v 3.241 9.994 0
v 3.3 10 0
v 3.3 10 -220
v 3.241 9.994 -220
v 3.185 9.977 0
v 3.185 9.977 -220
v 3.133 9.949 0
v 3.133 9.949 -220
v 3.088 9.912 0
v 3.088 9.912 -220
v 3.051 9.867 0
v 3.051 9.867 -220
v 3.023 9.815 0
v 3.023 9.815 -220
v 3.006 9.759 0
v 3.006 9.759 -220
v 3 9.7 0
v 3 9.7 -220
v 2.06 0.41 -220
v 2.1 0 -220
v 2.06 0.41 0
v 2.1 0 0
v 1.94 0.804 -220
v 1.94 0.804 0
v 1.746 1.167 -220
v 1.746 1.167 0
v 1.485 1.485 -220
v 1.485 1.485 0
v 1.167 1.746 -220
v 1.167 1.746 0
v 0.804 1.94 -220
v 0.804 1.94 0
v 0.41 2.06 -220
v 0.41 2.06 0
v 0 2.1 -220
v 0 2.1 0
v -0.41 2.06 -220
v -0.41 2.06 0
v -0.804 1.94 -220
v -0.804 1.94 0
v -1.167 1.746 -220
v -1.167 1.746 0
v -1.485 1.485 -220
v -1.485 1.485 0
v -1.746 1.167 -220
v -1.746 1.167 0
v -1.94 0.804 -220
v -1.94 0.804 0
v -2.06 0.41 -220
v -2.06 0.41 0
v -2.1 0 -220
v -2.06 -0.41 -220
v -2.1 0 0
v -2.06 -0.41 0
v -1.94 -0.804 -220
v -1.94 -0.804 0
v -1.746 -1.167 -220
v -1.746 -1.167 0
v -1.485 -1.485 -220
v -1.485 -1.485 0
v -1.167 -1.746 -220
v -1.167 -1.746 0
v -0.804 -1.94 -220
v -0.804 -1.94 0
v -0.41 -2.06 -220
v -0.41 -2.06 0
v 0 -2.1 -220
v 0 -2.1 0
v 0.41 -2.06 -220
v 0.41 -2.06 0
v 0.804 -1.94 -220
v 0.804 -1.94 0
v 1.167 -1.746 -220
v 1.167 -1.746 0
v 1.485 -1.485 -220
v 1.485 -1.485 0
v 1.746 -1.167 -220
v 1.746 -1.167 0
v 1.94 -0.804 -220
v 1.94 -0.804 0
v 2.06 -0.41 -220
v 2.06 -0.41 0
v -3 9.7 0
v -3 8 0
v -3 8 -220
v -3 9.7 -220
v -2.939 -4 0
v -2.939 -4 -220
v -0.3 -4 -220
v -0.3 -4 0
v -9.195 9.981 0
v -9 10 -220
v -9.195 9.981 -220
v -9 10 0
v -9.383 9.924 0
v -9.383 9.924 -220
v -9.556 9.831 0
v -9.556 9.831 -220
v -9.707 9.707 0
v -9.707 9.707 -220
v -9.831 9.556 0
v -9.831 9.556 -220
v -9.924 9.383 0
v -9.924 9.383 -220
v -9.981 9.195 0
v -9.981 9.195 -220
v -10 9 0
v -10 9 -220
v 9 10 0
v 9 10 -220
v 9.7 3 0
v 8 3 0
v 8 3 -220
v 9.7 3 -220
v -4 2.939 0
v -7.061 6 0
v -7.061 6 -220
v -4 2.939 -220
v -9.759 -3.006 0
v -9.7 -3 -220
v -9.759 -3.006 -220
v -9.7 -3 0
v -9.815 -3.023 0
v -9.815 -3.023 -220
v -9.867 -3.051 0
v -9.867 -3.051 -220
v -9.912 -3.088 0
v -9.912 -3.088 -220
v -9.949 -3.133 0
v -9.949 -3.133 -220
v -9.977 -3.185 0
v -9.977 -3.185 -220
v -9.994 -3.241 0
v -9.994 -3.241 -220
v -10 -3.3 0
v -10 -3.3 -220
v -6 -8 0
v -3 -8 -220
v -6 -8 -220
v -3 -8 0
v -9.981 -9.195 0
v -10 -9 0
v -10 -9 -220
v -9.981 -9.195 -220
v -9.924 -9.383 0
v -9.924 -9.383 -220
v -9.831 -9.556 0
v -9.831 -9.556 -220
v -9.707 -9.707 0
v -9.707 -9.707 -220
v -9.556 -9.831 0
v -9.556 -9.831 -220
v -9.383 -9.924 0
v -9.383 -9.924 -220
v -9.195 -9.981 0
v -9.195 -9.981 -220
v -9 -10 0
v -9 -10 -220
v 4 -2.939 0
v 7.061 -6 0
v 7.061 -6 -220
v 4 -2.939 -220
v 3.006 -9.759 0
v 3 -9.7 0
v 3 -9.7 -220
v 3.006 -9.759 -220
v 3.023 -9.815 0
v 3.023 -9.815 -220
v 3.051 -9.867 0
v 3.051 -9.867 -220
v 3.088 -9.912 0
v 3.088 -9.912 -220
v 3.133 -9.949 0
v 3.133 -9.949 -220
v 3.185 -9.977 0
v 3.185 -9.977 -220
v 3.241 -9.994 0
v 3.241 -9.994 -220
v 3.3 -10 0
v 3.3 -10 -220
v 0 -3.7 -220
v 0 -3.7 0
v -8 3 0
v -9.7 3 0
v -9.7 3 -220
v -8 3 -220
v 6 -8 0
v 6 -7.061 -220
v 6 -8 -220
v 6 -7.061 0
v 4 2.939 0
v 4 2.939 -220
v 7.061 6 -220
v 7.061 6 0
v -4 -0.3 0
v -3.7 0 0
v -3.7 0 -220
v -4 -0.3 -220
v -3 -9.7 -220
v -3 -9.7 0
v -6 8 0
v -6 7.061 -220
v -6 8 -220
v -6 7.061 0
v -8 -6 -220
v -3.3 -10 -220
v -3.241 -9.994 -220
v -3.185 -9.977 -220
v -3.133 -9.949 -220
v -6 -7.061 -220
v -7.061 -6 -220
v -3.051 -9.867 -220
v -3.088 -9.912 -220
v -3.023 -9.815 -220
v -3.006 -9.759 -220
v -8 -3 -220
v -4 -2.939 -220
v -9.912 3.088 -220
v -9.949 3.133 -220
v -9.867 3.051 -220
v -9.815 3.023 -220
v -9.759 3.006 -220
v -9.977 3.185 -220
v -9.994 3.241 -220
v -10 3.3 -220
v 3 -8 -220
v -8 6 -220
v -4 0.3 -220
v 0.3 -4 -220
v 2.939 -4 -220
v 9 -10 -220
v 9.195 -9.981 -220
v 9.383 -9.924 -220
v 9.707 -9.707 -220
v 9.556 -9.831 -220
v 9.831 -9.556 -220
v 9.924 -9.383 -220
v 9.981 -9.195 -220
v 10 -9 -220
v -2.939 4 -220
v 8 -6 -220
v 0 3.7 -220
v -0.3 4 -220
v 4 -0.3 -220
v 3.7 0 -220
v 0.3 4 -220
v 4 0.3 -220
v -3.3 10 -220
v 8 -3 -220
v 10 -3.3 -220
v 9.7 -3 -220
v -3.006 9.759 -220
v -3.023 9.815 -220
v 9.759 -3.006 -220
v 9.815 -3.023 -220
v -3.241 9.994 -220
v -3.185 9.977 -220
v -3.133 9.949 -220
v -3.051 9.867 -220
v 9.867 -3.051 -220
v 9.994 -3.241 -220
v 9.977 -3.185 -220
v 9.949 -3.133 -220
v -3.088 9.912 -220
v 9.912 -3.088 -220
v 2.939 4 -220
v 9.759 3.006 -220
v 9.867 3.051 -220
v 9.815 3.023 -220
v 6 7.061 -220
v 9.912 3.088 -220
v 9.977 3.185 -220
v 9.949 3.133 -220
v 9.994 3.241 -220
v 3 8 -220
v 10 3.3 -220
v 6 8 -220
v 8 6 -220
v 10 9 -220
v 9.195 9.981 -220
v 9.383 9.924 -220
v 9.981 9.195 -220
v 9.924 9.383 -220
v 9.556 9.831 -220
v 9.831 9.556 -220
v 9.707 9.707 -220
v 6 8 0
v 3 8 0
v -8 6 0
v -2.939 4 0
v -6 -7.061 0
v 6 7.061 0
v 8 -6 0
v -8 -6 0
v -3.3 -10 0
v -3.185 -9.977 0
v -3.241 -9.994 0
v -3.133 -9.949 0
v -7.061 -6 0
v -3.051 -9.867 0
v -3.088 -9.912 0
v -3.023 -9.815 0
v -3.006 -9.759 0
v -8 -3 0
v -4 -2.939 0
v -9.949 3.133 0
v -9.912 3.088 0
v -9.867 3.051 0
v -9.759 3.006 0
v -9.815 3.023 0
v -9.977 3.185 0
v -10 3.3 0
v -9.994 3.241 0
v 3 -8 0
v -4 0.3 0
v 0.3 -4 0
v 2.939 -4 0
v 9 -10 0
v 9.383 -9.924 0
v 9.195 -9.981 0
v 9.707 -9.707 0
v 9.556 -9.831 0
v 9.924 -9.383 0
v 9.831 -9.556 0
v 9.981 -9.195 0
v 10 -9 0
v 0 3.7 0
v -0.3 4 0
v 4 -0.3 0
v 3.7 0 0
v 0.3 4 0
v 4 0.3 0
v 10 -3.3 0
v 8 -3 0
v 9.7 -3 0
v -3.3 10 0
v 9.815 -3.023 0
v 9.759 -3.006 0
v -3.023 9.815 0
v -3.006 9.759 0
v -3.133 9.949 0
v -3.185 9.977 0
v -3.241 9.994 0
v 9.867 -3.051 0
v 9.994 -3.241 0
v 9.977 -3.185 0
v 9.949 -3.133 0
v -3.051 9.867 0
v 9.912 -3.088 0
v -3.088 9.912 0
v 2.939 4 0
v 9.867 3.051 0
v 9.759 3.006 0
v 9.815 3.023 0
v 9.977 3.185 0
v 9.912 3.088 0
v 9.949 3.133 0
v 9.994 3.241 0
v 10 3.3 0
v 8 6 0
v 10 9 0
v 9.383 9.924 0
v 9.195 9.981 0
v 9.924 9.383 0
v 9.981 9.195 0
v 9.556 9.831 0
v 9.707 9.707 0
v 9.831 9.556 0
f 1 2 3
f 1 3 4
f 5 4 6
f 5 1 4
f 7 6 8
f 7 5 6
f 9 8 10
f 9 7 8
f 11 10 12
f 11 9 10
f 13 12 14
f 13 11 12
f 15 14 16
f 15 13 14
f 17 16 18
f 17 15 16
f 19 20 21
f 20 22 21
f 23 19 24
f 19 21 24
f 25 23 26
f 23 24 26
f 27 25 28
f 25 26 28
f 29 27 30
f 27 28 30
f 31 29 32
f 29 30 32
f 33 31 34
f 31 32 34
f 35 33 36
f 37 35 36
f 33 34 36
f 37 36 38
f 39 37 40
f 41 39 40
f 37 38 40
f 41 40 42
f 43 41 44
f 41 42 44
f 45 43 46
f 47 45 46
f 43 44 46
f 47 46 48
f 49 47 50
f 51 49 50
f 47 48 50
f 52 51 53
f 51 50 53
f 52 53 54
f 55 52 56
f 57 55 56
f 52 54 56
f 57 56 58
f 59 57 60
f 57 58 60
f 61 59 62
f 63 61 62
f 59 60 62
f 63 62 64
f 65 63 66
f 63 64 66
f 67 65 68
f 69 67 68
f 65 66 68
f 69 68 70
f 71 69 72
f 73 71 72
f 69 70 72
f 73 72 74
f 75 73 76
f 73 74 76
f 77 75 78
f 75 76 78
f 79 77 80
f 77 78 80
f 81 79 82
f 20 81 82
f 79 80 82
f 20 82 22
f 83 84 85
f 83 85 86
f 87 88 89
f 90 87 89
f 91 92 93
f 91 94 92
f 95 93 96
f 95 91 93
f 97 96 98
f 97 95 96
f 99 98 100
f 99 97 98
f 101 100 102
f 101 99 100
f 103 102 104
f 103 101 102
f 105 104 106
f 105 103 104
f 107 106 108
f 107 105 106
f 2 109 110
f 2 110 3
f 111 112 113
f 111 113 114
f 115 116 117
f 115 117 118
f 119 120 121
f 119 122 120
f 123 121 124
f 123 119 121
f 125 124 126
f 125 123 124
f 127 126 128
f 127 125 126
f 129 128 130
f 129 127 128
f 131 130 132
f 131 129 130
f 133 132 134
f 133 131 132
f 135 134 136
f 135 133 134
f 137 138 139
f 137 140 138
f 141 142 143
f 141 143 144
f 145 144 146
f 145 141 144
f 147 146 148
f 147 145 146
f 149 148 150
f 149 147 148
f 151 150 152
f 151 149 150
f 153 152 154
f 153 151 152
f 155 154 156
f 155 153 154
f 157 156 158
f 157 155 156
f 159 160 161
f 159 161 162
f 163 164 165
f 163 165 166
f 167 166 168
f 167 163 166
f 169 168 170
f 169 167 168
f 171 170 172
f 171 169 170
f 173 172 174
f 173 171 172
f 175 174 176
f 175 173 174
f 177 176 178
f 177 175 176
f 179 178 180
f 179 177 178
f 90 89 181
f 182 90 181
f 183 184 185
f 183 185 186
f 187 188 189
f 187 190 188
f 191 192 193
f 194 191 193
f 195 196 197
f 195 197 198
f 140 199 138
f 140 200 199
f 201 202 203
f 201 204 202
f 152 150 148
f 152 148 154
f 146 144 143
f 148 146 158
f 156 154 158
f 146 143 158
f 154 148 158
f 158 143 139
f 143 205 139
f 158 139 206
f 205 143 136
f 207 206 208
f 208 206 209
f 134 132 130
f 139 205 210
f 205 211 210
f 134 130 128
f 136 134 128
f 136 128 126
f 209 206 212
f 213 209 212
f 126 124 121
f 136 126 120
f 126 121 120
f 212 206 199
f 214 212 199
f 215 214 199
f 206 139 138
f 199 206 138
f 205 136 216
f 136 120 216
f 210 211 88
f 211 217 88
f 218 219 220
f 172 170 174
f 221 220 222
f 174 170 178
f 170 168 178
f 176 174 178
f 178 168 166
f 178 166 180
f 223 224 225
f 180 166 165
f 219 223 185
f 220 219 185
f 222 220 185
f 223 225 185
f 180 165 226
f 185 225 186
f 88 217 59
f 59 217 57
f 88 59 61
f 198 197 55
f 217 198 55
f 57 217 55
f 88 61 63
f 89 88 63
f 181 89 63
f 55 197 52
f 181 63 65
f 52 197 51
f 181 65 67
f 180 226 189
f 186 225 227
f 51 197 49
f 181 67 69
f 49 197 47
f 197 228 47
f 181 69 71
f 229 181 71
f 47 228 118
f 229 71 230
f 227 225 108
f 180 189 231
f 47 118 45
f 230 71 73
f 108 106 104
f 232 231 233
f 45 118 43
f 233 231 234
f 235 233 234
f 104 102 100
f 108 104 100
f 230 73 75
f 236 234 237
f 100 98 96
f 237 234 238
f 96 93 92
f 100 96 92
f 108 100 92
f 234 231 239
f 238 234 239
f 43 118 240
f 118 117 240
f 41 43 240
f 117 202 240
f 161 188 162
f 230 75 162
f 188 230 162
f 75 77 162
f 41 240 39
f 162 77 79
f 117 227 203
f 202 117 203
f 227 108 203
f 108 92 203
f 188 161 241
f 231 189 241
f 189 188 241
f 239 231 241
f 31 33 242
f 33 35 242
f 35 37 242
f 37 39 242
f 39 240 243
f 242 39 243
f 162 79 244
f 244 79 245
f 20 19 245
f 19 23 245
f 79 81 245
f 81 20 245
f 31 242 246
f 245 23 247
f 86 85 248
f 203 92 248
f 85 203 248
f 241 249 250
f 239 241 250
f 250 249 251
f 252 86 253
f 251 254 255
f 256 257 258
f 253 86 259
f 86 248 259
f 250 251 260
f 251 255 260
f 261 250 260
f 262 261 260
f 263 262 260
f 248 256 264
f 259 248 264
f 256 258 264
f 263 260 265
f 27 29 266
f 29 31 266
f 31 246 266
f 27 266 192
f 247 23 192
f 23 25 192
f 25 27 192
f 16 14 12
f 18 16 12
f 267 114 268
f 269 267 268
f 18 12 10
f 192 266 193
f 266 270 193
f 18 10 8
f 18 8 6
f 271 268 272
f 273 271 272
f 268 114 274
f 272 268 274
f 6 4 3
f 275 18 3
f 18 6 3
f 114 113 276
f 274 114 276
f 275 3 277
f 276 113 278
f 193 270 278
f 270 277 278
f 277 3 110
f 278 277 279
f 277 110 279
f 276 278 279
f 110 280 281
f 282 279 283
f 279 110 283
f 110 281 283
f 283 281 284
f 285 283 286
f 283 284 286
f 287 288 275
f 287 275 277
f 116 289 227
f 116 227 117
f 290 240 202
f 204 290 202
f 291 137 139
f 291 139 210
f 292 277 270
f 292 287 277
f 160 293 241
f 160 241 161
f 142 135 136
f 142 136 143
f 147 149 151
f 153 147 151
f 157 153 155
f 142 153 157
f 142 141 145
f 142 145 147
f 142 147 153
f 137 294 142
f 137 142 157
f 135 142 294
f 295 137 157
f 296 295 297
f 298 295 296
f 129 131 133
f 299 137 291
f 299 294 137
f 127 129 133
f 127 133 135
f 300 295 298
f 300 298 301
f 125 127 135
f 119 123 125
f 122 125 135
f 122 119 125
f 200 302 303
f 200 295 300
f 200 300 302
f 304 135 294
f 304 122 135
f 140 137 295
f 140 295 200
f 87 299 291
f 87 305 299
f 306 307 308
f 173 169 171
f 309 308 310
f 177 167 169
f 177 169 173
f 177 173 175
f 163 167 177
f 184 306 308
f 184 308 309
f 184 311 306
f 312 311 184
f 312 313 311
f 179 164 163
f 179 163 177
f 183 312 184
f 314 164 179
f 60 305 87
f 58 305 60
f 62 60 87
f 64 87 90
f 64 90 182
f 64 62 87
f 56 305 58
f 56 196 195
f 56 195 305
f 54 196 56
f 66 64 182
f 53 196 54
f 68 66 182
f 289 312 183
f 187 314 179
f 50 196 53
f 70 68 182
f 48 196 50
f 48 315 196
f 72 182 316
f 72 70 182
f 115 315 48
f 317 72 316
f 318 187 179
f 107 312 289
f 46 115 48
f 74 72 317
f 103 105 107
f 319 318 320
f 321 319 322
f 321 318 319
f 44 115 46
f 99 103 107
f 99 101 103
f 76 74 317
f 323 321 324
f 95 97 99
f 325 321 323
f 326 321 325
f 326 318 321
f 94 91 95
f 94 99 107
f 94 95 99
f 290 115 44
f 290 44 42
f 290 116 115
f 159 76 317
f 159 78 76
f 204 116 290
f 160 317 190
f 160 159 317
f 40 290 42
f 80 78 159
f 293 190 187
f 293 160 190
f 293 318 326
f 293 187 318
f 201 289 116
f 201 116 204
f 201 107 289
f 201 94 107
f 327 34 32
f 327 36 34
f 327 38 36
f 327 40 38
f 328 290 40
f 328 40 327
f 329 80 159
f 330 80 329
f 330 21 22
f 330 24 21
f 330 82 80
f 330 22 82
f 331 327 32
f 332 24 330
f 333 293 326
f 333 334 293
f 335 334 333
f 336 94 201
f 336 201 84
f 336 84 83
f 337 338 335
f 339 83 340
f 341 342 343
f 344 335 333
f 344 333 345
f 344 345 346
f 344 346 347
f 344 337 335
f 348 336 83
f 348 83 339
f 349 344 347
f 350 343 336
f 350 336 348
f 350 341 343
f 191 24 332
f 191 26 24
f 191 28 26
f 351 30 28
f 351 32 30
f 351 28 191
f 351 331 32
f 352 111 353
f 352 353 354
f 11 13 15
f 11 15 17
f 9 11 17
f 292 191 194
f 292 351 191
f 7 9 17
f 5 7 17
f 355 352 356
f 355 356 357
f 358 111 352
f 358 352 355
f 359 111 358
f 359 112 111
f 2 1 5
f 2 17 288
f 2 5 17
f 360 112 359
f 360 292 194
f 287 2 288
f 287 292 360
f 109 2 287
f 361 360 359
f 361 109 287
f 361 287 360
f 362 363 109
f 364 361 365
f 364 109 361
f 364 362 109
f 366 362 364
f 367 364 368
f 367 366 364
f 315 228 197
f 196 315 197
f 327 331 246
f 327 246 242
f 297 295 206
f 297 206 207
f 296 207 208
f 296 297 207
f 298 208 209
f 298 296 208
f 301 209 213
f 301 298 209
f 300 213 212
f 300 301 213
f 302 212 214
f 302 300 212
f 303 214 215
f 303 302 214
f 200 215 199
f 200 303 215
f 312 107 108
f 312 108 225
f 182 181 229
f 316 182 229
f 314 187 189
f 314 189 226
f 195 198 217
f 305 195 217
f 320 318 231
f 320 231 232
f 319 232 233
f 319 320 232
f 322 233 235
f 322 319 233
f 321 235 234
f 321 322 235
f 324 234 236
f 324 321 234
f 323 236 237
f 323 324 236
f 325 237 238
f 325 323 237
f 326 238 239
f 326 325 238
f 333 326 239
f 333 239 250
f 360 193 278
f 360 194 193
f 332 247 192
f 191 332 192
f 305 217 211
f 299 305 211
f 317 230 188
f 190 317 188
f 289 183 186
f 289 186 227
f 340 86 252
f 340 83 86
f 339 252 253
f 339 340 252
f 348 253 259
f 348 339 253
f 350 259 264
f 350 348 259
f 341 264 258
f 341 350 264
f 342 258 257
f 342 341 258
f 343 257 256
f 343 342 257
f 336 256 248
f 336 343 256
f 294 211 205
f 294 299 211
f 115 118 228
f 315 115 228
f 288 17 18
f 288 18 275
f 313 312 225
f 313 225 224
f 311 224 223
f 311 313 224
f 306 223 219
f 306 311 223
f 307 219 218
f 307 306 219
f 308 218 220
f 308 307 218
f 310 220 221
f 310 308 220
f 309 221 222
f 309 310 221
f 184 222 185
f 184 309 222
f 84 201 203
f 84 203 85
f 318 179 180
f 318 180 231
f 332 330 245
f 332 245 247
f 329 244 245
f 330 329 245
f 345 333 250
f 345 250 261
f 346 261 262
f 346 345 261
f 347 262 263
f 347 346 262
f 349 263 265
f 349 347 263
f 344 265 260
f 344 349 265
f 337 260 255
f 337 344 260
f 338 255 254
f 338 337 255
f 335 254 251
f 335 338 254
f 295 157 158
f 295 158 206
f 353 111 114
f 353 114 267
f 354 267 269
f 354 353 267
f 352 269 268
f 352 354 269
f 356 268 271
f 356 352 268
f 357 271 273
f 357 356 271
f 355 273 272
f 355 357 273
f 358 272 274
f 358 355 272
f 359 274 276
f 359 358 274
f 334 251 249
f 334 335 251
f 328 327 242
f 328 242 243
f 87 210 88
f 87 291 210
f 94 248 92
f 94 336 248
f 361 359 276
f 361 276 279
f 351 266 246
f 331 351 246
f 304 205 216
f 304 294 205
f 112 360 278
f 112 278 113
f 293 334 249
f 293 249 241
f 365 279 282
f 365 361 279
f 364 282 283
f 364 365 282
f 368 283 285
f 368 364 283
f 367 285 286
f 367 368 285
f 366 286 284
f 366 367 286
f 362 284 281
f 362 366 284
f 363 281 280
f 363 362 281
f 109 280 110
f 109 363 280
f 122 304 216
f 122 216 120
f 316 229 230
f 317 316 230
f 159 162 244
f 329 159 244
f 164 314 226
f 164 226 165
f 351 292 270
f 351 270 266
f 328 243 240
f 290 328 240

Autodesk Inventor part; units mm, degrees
ref_plane "YZ Plane" through (0, 0, 0) normal (1, 0, 0) x (0, 1, 0)
ref_plane "XZ Plane" through (0, 0, 0) normal (0, 1, 0) x (-1, 0, 0)
ref_plane "XY Plane" through (0, 0, 0) normal (0, 0, 1) x (1, 0, 0)
sketch "Sketch_5" plane through (0, 0, 0) normal (0, 0, 1) x (1, 0, 0)
  line L0 (-10, 9) -> (-10, 3.3)
  arc A0 (-10, 3.3) -> (-9.7, 3) centre (-9.7, 3.3) ccw
  line L1 (-9.7, 3) -> (-8, 3)
  line L2 (-8, 3) -> (-8, 6)
  line L3 (-8, 6) -> (-7.0607, 6)
  line L4 (-7.0607, 6) -> (-4, 2.9393)
  line L5 (-4, 2.9393) -> (-4, 0.3)
  line L6 (-4, 0.3) -> (-3.7, 0)
  line L7 (-3.7, 0) -> (-4, -0.3)
  line L8 (-4, -0.3) -> (-4, -2.9393)
  line L9 (-4, -2.9393) -> (-7.0607, -6)
  line L10 (-7.0607, -6) -> (-8, -6)
  line L11 (-8, -6) -> (-8, -3)
  line L12 (-8, -3) -> (-9.7, -3)
  arc A1 (-9.7, -3) -> (-10, -3.3) centre (-9.7, -3.3) ccw
  line L13 (-10, -3.3) -> (-10, -9)
  arc A2 (-10, -9) -> (-9, -10) centre (-9, -9) ccw
  line L14 (-9, -10) -> (-3.3, -10)
  arc A3 (-3.3, -10) -> (-3, -9.7) centre (-3.3, -9.7) ccw
  line L15 (-3, -9.7) -> (-3, -8)
  line L16 (-3, -8) -> (-6, -8)
  line L17 (-6, -8) -> (-6, -7.0607)
  line L18 (-6, -7.0607) -> (-2.9393, -4)
  line L19 (-2.9393, -4) -> (-0.3, -4)
  line L20 (-0.3, -4) -> (0, -3.7)
  line L21 (0, -3.7) -> (0.3, -4)
  line L22 (0.3, -4) -> (2.9393, -4)
  line L23 (2.9393, -4) -> (6, -7.0607)
  line L24 (6, -7.0607) -> (6, -8)
  line L25 (6, -8) -> (3, -8)
  line L26 (3, -8) -> (3, -9.7)
  arc A4 (3, -9.7) -> (3.3, -10) centre (3.3, -9.7) ccw
  line L27 (3.3, -10) -> (9, -10)
  arc A5 (9, -10) -> (10, -9) centre (9, -9) ccw
  line L28 (10, -9) -> (10, -3.3)
  arc A6 (10, -3.3) -> (9.7, -3) centre (9.7, -3.3) ccw
  line L29 (9.7, -3) -> (8, -3)
  line L30 (8, -3) -> (8, -6)
  line L31 (8, -6) -> (7.0607, -6)
  line L32 (7.0607, -6) -> (4, -2.9393)
  line L33 (4, -2.9393) -> (4, -0.3)
  line L34 (4, -0.3) -> (3.7, 0)
  line L35 (3.7, 0) -> (4, 0.3)
  line L36 (4, 0.3) -> (4, 2.9393)
  line L37 (4, 2.9393) -> (7.0607, 6)
  line L38 (7.0607, 6) -> (8, 6)
  line L39 (8, 6) -> (8, 3)
  line L40 (8, 3) -> (9.7, 3)
  arc A7 (9.7, 3) -> (10, 3.3) centre (9.7, 3.3) ccw
  line L41 (10, 3.3) -> (10, 9)
  arc A8 (10, 9) -> (9, 10) centre (9, 9) ccw
  line L42 (9, 10) -> (3.3, 10)
  arc A9 (3.3, 10) -> (3, 9.7) centre (3.3, 9.7) ccw
  line L43 (3, 9.7) -> (3, 8)
  line L44 (3, 8) -> (6, 8)
  line L45 (6, 8) -> (6, 7.0607)
  line L46 (6, 7.0607) -> (2.9393, 4)
  line L47 (2.9393, 4) -> (0.3, 4)
  line L48 (0.3, 4) -> (0, 3.7)
  line L49 (0, 3.7) -> (-0.3, 4)
  line L50 (-0.3, 4) -> (-2.9393, 4)
  line L51 (-2.9393, 4) -> (-6, 7.0607)
  line L52 (-6, 7.0607) -> (-6, 8)
  line L53 (-6, 8) -> (-3, 8)
  line L54 (-3, 8) -> (-3, 9.7)
  arc A10 (-3, 9.7) -> (-3.3, 10) centre (-3.3, 9.7) ccw
  line L55 (-3.3, 10) -> (-9, 10)
  arc A11 (-9, 10) -> (-10, 9) centre (-9, 9) ccw
  circle A12 centre (0, 0) radius 2.1
extrude "Extrusion1" add sketch "Sketch_5" against normal blind 220
properties part number "KHFS5-2020-4000" material "Aluminum 6061"
